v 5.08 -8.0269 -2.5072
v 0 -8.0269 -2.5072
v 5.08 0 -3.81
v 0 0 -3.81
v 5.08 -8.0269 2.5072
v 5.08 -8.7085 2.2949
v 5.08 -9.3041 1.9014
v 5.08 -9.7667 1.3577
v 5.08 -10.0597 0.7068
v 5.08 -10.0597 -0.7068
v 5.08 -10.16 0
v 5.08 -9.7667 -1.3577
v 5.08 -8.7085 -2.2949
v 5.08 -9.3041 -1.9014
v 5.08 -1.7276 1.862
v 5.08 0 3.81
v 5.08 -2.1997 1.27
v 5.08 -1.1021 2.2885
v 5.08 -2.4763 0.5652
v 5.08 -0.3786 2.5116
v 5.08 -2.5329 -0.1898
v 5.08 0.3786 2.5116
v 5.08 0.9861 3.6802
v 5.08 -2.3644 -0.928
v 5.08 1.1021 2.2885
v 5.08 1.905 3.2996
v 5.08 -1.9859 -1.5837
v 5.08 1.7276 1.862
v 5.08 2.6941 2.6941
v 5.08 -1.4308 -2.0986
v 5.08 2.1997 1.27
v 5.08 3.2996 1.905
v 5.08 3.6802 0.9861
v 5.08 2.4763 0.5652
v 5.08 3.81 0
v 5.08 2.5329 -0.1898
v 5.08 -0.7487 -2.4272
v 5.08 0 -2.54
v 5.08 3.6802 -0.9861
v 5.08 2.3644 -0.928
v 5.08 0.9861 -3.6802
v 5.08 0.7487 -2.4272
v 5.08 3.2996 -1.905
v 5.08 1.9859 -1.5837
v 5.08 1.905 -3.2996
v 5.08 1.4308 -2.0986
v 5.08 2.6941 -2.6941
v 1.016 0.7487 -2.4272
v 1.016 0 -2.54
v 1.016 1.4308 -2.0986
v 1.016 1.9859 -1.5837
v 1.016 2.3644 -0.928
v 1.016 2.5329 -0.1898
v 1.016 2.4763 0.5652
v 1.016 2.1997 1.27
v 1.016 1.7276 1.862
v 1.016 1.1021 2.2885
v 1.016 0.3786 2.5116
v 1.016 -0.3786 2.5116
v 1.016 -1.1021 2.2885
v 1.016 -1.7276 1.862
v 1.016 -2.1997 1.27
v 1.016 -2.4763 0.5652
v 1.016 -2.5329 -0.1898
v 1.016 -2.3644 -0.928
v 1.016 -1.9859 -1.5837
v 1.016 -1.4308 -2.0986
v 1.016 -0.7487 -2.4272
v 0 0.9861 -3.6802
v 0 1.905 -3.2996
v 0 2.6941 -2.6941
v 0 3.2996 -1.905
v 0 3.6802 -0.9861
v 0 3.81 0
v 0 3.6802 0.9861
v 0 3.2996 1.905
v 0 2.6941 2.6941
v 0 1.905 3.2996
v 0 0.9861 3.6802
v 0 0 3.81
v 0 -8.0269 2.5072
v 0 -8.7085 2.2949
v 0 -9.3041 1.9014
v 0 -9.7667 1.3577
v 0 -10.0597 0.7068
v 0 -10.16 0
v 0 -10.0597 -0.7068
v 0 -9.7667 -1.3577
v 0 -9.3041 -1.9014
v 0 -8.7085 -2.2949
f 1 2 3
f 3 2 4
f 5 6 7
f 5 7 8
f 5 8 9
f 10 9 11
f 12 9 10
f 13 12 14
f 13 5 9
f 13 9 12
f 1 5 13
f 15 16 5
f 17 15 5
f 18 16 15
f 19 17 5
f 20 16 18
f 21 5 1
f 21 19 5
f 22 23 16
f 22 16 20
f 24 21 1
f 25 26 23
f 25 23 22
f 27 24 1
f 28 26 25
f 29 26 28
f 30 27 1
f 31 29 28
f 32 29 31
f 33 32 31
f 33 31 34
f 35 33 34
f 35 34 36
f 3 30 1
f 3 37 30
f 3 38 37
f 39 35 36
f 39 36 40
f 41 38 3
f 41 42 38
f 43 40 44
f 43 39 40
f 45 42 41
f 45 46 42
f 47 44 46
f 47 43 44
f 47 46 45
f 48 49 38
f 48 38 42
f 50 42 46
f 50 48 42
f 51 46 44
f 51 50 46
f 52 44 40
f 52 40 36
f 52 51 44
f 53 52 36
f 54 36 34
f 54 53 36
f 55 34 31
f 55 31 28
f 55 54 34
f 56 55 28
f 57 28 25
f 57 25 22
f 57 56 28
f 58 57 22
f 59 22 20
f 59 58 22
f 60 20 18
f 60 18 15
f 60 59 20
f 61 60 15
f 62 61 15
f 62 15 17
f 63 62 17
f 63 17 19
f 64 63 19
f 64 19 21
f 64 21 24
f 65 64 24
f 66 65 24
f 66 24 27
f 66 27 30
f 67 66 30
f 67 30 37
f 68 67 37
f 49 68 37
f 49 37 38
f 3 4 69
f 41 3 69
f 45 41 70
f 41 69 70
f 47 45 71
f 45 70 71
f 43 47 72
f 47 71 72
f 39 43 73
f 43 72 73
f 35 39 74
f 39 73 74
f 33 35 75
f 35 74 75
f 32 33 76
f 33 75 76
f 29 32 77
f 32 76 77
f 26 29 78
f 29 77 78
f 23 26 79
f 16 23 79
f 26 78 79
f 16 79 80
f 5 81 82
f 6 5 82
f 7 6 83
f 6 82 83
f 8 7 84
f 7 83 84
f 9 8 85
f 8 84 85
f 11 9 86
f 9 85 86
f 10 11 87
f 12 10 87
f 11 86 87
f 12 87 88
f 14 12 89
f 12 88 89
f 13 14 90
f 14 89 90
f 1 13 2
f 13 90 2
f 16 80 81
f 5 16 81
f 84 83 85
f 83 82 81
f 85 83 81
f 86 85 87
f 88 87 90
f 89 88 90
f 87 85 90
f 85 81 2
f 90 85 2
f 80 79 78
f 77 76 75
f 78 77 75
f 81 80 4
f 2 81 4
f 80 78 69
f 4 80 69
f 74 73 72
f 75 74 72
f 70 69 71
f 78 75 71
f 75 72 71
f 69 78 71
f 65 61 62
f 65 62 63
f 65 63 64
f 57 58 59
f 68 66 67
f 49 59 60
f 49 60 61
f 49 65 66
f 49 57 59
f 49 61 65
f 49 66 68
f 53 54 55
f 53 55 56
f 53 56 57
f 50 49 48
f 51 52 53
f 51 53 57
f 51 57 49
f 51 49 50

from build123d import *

# Parameters (mm, degrees)
SKETCH1_R           = 2.54
BOSS_EXTRUDE1_DEPTH = 5.08
SKETCH1_2_R         = 2.54
BOSS_EXTRUDE2_DEPTH = 1.016


with BuildPart() as part:
    # Sketch1 → Boss-Extrude1 (new body)
    with BuildSketch(Plane(origin=(0, 0, 0), x_dir=(0, 0, -1), z_dir=(1, 0, 0))):
        with BuildLine():
            Line((-3.81, 0), (-2.507191408, -8.026929038))
            ThreePointArc((-2.507191408, -8.026929038), (0, -10.16), (2.507191408, -8.026929038))
            Line((2.507191408, -8.026929038), (3.81, 0))
            ThreePointArc((3.81, 0), (0, 3.81), (-3.81, 0))
        make_face()
        Circle(SKETCH1_R, mode=Mode.SUBTRACT)
    extrude(amount=BOSS_EXTRUDE1_DEPTH)

    # Sketch1<2> → Boss-Extrude2 (add)
    with BuildSketch(Plane(origin=(0, 0, 0), x_dir=(0, 0, -1), z_dir=(1, 0, 0))):
        Circle(SKETCH1_2_R)
    extrude(amount=BOSS_EXTRUDE2_DEPTH)


solid = part.part
